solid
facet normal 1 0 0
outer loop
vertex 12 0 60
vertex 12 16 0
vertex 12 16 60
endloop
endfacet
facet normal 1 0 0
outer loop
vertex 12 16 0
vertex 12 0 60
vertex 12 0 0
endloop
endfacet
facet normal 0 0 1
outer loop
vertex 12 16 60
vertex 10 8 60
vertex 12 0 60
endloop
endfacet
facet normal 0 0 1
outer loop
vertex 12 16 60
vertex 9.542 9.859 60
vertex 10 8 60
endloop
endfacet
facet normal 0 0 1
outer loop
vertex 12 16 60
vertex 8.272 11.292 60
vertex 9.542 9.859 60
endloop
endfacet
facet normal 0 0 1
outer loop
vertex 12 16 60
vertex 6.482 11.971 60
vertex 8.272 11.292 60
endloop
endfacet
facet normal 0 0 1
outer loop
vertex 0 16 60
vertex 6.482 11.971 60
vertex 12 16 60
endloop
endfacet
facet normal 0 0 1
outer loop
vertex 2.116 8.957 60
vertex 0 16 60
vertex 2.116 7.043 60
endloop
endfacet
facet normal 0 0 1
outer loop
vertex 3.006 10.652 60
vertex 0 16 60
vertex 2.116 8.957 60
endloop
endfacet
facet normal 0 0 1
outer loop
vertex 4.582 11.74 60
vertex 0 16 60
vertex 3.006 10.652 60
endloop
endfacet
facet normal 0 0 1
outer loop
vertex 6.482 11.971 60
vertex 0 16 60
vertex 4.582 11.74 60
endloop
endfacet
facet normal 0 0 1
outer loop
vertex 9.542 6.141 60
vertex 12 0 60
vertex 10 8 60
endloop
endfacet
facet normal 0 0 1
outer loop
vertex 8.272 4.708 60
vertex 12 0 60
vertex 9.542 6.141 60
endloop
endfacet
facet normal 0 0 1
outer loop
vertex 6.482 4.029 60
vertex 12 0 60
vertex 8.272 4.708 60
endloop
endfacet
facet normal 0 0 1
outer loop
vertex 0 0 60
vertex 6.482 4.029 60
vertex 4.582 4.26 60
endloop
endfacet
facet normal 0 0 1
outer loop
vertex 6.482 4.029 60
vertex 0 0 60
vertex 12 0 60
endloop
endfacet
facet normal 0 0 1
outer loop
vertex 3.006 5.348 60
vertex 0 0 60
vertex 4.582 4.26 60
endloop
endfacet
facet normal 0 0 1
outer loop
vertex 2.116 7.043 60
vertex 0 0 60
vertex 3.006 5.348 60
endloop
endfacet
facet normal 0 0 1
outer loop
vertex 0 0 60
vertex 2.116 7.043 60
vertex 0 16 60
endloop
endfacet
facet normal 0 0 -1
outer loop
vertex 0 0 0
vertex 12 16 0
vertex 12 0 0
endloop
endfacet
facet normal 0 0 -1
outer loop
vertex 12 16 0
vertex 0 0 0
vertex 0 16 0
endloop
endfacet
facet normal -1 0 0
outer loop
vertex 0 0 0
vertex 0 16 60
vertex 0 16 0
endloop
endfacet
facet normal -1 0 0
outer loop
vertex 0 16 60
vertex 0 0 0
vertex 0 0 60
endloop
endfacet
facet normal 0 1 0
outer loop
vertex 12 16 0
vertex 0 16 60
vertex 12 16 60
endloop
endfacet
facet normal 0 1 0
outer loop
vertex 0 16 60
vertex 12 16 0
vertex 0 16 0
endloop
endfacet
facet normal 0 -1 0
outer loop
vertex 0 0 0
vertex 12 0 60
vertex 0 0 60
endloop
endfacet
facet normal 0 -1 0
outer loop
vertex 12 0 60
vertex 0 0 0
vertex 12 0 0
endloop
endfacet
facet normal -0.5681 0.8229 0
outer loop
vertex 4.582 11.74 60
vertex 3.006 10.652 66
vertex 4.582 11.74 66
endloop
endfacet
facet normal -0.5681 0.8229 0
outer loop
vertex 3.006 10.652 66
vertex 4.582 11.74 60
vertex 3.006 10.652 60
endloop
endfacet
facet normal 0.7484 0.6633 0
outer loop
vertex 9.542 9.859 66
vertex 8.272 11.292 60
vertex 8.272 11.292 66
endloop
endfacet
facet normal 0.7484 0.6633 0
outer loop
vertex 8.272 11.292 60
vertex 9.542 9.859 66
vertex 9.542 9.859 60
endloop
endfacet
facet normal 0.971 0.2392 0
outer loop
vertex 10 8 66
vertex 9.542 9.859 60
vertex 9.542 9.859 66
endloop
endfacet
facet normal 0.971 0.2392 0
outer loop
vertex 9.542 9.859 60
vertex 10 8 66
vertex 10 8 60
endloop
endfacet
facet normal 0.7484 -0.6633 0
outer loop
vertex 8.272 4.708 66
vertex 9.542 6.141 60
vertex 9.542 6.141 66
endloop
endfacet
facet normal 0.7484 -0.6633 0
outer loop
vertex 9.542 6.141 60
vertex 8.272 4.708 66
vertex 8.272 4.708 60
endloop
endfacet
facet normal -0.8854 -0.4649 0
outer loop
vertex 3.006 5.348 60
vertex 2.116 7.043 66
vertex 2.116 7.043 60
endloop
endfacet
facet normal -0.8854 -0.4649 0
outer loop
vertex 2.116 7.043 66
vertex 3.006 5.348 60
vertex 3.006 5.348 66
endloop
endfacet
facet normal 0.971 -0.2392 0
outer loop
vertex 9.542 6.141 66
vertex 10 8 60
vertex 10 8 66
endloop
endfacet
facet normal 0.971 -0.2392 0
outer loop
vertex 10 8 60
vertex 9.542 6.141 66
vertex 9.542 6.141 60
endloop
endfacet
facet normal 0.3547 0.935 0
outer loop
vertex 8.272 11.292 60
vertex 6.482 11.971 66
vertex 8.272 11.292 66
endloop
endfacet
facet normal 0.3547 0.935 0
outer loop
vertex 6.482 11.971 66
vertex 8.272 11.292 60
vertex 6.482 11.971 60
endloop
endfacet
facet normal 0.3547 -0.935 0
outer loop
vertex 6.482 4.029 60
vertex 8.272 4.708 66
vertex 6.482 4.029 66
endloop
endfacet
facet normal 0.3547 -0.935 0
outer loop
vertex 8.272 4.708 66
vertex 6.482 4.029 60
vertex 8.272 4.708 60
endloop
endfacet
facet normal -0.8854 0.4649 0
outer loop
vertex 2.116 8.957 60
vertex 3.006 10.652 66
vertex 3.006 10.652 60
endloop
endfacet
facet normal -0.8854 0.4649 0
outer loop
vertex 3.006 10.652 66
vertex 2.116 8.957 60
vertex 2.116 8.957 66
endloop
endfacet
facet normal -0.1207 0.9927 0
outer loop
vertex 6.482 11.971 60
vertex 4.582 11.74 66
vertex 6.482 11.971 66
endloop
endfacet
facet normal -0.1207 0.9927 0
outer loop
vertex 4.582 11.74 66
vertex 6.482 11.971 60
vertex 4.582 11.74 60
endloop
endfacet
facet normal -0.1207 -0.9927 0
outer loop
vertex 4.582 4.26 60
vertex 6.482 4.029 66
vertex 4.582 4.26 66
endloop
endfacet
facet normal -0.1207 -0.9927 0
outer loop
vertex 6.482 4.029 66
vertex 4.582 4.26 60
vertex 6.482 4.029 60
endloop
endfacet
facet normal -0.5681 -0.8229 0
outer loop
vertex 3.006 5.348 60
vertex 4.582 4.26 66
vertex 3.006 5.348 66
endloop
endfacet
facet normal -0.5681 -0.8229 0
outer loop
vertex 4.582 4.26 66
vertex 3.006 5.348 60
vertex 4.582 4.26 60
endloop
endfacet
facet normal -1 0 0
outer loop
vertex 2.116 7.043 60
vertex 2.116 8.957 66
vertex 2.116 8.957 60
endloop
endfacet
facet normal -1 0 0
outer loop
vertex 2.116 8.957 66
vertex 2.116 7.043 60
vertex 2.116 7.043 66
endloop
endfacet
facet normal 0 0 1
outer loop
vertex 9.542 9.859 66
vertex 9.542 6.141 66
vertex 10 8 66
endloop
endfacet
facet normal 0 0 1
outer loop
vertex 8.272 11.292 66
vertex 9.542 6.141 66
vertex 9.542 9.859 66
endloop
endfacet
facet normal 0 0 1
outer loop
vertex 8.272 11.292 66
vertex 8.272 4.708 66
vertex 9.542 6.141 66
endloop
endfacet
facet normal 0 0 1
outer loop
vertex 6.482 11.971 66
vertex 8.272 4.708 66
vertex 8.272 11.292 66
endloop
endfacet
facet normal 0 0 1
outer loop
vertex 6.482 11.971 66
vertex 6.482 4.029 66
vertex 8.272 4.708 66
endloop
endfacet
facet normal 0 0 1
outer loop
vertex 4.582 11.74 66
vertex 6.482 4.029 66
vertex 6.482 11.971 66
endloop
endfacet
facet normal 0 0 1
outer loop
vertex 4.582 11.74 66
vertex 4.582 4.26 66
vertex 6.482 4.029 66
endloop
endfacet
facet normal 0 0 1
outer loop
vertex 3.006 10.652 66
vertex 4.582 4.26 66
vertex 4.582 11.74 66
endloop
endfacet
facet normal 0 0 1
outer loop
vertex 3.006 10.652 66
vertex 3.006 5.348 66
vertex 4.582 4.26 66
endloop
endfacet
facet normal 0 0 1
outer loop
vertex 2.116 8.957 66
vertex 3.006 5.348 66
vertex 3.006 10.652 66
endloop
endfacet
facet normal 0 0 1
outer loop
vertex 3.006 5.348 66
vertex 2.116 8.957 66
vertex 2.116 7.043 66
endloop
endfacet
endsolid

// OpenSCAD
thickness = 12;
width = 16;
height = 60;

cube([thickness, width, height], false);


translate([(thickness / 2), (width / 2), height])
    cylinder((thickness / 2), (thickness / 3), (thickness / 3), false);
